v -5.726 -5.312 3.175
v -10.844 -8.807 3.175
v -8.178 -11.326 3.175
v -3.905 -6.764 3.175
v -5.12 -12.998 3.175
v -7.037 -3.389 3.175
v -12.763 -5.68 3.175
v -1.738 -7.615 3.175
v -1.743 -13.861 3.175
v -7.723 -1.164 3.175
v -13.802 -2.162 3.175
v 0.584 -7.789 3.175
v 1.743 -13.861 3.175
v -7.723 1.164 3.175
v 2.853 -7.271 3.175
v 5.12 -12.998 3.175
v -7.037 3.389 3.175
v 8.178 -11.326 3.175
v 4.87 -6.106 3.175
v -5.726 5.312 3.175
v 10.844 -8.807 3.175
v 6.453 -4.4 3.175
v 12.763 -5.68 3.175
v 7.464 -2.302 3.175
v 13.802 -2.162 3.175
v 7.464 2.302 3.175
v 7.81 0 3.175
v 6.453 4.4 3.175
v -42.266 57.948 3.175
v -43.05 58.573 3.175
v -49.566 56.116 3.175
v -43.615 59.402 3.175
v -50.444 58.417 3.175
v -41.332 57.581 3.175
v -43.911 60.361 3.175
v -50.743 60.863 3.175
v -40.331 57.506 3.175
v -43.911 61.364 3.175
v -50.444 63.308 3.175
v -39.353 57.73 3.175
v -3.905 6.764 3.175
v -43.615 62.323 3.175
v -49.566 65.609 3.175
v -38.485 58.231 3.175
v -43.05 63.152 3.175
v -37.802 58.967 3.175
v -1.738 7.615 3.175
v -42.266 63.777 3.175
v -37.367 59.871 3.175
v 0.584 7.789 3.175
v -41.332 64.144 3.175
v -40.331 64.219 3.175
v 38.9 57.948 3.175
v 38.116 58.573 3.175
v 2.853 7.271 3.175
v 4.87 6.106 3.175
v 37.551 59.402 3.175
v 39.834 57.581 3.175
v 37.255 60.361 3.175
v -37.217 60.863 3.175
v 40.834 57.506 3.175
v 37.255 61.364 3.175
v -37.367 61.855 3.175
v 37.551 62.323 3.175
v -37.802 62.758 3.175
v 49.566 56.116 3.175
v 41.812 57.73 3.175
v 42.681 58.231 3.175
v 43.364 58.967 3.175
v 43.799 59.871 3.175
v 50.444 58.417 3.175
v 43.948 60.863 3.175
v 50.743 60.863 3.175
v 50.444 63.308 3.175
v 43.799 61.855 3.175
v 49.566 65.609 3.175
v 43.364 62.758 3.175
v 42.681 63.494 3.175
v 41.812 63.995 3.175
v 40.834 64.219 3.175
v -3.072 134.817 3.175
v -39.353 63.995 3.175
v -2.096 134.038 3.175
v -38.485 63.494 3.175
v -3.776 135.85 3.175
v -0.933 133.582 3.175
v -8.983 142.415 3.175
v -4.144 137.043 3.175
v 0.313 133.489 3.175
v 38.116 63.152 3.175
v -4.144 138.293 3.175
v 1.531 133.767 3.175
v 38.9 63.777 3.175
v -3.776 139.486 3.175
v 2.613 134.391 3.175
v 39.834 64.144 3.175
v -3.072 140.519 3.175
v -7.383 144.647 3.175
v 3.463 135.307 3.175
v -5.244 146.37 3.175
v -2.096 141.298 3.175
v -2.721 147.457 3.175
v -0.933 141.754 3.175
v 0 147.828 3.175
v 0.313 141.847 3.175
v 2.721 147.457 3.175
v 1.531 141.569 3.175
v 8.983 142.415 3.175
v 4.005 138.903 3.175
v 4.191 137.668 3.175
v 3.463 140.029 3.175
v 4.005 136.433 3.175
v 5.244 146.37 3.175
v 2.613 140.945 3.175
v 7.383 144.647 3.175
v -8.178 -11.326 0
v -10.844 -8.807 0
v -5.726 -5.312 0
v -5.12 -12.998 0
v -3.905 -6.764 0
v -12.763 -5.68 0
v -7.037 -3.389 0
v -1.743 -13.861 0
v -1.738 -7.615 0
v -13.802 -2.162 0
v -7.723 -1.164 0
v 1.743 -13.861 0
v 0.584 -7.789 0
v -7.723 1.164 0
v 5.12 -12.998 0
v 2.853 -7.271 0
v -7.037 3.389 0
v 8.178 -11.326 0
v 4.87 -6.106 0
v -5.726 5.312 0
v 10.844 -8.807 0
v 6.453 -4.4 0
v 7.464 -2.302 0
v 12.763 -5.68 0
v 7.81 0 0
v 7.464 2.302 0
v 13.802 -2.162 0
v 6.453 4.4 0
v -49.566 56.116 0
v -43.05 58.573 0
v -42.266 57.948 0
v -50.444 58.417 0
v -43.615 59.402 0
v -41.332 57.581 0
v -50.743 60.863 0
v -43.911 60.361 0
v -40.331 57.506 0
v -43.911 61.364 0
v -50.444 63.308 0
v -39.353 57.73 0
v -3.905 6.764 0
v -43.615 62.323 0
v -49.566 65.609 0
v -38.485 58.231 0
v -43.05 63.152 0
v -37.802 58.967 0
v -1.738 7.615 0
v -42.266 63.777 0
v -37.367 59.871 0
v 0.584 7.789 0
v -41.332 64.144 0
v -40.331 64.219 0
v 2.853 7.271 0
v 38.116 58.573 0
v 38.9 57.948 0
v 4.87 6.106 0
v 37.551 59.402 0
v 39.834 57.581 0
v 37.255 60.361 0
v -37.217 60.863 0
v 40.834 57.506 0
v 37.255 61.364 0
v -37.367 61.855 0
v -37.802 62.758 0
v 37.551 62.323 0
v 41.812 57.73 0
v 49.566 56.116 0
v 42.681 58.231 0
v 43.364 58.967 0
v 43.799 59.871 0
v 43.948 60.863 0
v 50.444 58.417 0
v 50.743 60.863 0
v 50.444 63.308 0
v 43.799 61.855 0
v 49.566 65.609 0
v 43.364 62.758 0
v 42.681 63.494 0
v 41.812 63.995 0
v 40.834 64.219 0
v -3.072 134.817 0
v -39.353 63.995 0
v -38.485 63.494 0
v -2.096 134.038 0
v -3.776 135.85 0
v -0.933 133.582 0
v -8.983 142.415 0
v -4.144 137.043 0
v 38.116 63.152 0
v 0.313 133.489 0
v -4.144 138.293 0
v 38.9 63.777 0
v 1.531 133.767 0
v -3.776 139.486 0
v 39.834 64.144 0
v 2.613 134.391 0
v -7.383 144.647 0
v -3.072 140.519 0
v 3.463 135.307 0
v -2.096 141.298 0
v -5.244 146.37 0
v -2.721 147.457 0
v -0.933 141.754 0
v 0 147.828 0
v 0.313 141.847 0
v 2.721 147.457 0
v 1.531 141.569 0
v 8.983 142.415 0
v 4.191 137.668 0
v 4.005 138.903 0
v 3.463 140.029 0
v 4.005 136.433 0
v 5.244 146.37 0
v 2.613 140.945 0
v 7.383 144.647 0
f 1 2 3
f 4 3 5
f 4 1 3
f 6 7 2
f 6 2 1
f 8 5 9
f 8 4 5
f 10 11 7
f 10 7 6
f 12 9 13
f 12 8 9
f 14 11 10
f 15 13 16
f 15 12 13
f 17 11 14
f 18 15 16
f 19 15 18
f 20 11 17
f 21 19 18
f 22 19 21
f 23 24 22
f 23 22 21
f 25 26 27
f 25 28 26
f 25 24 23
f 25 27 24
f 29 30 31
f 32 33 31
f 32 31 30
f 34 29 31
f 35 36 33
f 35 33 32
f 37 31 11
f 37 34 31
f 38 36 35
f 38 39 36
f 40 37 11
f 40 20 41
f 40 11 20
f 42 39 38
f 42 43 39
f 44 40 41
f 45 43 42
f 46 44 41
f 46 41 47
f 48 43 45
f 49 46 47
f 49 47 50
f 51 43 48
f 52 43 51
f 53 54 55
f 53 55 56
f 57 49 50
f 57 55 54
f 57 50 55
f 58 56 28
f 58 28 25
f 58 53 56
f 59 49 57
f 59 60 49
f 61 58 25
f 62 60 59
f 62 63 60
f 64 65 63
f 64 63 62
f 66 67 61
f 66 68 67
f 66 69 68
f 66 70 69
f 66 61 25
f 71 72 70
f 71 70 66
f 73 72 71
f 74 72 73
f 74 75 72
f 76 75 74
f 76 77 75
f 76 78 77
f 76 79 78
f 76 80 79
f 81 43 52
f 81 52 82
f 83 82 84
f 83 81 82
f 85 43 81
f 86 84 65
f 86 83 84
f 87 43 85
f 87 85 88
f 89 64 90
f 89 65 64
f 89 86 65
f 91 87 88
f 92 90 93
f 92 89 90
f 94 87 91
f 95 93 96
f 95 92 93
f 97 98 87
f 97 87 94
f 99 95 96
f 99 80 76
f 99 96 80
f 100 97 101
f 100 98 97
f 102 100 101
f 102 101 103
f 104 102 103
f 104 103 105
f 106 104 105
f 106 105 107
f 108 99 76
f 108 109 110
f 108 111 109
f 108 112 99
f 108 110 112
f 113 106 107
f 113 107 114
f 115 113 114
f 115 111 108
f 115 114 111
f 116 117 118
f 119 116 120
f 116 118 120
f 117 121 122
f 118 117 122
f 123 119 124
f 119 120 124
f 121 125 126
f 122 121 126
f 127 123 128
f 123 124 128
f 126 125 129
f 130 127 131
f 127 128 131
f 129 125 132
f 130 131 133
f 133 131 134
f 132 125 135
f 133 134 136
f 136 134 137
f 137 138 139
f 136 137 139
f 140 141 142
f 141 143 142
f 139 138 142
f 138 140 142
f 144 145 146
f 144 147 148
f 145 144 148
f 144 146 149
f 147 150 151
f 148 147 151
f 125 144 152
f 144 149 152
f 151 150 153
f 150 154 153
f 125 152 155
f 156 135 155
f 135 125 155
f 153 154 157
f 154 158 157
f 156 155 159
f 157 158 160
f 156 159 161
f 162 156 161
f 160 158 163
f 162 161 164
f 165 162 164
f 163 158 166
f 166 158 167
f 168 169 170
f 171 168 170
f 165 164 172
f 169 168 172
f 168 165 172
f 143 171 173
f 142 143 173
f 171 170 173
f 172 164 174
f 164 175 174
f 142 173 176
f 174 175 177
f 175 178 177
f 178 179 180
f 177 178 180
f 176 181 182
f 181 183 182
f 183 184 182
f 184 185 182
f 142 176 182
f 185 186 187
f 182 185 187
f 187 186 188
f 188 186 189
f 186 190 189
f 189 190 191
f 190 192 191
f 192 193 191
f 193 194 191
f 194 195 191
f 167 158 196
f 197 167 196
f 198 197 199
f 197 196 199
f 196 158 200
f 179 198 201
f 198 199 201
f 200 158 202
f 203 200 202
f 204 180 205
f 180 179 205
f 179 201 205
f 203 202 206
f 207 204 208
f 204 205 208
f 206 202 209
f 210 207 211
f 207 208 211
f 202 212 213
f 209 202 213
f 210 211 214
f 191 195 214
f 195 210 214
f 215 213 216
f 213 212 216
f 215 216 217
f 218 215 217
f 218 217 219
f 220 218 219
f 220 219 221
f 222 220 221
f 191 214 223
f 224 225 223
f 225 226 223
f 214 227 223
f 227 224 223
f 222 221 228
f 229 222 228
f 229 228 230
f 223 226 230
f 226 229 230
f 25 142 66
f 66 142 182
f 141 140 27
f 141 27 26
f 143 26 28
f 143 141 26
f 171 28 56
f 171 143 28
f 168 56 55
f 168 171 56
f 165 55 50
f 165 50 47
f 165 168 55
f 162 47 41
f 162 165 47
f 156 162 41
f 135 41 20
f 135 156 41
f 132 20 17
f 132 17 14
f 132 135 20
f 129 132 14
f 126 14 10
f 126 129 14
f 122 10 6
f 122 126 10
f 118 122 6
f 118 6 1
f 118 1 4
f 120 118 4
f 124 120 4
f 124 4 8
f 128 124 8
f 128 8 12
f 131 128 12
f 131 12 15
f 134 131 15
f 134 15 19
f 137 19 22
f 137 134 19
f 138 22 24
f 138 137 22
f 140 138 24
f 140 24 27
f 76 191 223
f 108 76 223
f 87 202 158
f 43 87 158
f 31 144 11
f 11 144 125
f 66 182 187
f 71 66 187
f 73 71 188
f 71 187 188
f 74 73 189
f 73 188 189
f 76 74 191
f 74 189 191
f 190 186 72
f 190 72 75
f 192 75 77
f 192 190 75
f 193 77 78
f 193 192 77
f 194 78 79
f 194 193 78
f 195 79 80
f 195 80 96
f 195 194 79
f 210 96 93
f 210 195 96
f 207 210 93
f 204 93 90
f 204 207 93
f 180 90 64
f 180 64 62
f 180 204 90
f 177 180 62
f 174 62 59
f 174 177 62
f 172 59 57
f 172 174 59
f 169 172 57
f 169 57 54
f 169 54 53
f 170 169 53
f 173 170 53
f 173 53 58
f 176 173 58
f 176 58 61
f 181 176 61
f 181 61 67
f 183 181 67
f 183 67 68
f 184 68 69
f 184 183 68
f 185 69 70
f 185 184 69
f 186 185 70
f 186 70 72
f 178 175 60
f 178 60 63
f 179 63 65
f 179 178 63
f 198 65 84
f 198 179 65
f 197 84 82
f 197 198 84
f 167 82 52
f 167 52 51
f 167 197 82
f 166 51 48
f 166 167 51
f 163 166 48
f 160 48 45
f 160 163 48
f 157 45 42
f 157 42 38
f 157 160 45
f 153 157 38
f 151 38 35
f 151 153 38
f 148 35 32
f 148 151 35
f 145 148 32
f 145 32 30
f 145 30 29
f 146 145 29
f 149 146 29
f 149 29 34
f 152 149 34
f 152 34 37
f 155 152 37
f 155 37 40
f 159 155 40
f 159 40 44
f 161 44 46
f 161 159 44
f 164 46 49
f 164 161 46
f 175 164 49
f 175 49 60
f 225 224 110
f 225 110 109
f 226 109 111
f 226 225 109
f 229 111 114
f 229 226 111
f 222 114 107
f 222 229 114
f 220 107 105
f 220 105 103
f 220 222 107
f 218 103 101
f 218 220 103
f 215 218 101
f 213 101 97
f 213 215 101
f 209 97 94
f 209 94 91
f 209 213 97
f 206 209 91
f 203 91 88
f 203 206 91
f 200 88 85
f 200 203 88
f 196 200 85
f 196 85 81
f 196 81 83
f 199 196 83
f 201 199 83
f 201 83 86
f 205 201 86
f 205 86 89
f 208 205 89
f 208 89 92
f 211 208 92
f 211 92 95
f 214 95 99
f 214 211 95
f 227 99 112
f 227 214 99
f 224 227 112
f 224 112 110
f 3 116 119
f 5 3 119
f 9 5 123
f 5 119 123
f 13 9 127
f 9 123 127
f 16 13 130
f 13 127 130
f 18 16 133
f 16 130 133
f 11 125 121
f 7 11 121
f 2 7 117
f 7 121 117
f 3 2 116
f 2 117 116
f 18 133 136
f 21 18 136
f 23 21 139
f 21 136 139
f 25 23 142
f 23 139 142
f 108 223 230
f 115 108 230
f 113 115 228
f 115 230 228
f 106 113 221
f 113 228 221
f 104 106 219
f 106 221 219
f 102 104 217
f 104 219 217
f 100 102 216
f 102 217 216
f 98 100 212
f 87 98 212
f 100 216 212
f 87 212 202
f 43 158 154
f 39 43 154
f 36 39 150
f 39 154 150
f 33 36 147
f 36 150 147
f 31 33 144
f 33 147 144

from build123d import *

# Parameters (mm, degrees)
SKETCH1_R           = 3.3655
SKETCH1_R_2         = 11.571823904
SKETCH1_R_3         = 4.191
SKETCH1_R_4         = 7.8105
BOSS_EXTRUDE1_DEPTH = 3.175


with BuildPart() as part:
    # Sketch1 → Boss-Extrude1 (new body)
    # profile 1 of 7: a face of its own
    with BuildSketch(Plane.XY):
        with BuildLine():
            ThreePointArc((-13.801669145, -2.162135242), (-13.92785371, -1.084338979), (-13.97, 0))
            Line((-13.97, 0), (-10.16, 137.668))
            ThreePointArc((-10.16, 137.668), (-9.861385845, 140.113131739), (-8.98309661, 142.414532976))
            Line((-8.98309661, 142.414532976), (-49.565953559, 65.609056962))
            ThreePointArc((-49.565953559, 65.609056962), (-50.742856949, 60.862523985), (-49.565953559, 56.115991009))
            Line((-49.565953559, 56.115991009), (-13.801669145, -2.162135242))
        make_face()
        with Locations((-40.582856949, 60.862523985)):
            Circle(SKETCH1_R, mode=Mode.SUBTRACT)
    # profile 2 of 7: a face of its own
    with BuildSketch(Plane.XY):
        with BuildLine():
            Line((49.565953559, 65.609056962), (8.98309661, 142.414532976))
            ThreePointArc((8.98309661, 142.414532976), (9.861385845, 140.113131739), (10.16, 137.668))
            Line((10.16, 137.668), (13.97, 0))
            ThreePointArc((13.97, 0), (13.92785371, -1.084338979), (13.801669145, -2.162135242))
            Line((13.801669145, -2.162135242), (49.565953559, 56.115991009))
            ThreePointArc((49.565953559, 56.115991009), (50.742856949, 60.862523985), (49.565953559, 65.609056962))
        make_face()
        with Locations((40.582856949, 60.862523985)):
            Circle(SKETCH1_R, mode=Mode.SUBTRACT)
    # profile 3 of 7: a face of its own
    with BuildSketch(Plane.XY):
        with BuildLine():
            ThreePointArc((-10.16, 137.668), (7.886144716, 68.281846548), (-13.97, 0))
            ThreePointArc((-13.97, 0), (-13.92785371, -1.084338979), (-13.801669145, -2.162135242))
            Line((-13.801669145, -2.162135242), (-8.177790267, -11.326281223))
            ThreePointArc((-8.177790267, -11.326281223), (0, -13.97), (8.177790267, -11.326281223))
            Line((8.177790267, -11.326281223), (13.801669145, -2.162135242))
            ThreePointArc((13.801669145, -2.162135242), (13.92785371, -1.084338979), (13.97, 0))
            Line((13.97, 0), (10.16, 137.668))
            ThreePointArc((10.16, 137.668), (9.861385845, 140.113131739), (8.98309661, 142.414532976))
            ThreePointArc((8.98309661, 142.414532976), (0, 147.828), (-8.98309661, 142.414532976))
            ThreePointArc((-8.98309661, 142.414532976), (-9.861385845, 140.113131739), (-10.16, 137.668))
        make_face()
        Circle(SKETCH1_R_2, mode=Mode.SUBTRACT)
        with Locations((0, 137.668)):
            Circle(SKETCH1_R_3, mode=Mode.SUBTRACT)
    # profile 4 of 7: a face of its own
    with BuildSketch(Plane.XY):
        with BuildLine():
            ThreePointArc((-10.16, 137.668), (7.886144716, 68.281846548), (-13.97, 0))
            Line((-13.97, 0), (-10.16, 137.668))
        make_face()
    # profile 5 of 7: a face of its own
    with BuildSketch(Plane.XY):
        with BuildLine():
            Line((13.801669145, -2.162135242), (8.177790267, -11.326281223))
            ThreePointArc((8.177790267, -11.326281223), (11.906701974, -7.306938353), (13.801669145, -2.162135242))
        make_face()
    # profile 6 of 7: a face of its own
    with BuildSketch(Plane.XY):
        with BuildLine():
            Line((-8.177790267, -11.326281223), (-13.801669145, -2.162135242))
            ThreePointArc((-13.801669145, -2.162135242), (-11.906701974, -7.306938353), (-8.177790267, -11.326281223))
        make_face()
    # profile 7 of 7: a face of its own
    with BuildSketch(Plane.XY):
        Circle(SKETCH1_R_2)
        Circle(SKETCH1_R_4, mode=Mode.SUBTRACT)
    extrude(amount=BOSS_EXTRUDE1_DEPTH)


solid = part.part
